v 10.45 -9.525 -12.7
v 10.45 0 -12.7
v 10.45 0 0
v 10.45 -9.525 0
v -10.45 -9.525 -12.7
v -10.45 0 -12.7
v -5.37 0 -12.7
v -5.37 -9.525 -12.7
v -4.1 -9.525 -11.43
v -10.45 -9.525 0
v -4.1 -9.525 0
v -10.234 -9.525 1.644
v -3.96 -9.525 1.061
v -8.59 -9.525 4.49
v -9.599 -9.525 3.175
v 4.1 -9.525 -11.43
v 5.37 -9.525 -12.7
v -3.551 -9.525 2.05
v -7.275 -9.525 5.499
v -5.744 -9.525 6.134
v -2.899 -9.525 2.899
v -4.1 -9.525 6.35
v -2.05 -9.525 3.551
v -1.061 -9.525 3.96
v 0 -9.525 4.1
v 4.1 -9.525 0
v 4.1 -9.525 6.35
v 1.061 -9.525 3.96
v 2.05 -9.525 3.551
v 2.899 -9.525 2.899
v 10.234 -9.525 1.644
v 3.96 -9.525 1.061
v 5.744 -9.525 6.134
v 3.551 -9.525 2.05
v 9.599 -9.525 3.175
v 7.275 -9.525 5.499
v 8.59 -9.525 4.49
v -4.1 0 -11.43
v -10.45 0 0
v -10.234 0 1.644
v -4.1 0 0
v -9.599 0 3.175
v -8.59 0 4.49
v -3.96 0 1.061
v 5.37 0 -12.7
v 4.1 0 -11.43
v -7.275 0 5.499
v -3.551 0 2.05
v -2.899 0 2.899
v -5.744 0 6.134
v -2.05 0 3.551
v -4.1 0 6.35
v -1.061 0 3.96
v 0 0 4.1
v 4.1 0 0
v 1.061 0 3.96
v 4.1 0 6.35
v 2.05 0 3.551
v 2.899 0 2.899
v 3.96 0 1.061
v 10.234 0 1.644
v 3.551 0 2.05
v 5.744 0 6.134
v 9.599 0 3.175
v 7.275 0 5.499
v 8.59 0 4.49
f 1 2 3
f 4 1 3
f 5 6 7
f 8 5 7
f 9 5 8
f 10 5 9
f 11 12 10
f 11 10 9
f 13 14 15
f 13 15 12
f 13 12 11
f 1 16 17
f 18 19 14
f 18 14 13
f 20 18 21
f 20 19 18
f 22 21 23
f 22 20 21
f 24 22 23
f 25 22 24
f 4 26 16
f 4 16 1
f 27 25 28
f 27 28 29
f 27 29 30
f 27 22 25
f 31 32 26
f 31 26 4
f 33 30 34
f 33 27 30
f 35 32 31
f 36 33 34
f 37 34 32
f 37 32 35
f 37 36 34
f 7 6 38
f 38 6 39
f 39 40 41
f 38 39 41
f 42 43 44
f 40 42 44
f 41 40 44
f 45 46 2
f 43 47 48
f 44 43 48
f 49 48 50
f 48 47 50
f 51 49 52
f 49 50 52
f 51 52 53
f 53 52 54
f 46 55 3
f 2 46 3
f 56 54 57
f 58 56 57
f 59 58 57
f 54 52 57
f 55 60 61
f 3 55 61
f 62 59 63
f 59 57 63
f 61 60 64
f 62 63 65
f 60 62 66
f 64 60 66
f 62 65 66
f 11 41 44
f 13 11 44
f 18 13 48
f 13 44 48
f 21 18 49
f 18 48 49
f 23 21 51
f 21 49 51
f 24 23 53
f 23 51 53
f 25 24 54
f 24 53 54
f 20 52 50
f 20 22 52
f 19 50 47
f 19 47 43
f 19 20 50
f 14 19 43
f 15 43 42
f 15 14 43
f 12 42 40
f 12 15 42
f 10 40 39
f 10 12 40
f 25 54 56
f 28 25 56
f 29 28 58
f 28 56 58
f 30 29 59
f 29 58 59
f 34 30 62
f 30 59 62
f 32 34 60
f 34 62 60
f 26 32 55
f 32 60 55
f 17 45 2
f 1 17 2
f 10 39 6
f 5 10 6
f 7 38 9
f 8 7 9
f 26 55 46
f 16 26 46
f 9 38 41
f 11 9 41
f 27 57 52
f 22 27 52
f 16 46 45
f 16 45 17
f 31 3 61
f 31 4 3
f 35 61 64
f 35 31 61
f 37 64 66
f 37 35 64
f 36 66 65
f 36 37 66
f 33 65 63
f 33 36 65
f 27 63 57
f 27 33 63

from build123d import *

# Parameters (mm, degrees)
F1_DEPTH = 9.525
F2_R     = 6.35
F3_SIZE  = 1.27


with BuildPart() as f1:
    # F0 (on Front) → F1 (new body)
    with BuildSketch(Plane.XZ):
        with BuildLine():
            Line((-4.1, -12.7), (-4.1, 0))
            ThreePointArc((-4.1, 0), (-2.899138, 2.899138), (0, 4.1))
            Line((0, 4.1), (0, 6.35))
            Line((0, 6.35), (-10.45, 6.35))
            Line((-10.45, 6.35), (-10.45, -12.7))
            Line((-10.45, -12.7), (-4.1, -12.7))
        make_face()
        with BuildLine():
            Line((0, 6.35), (0, 4.1))
            ThreePointArc((0, 4.1), (2.899138, 2.899138), (4.1, 0))
            Line((4.1, 0), (4.1, -12.7))
            Line((4.1, -12.7), (10.45, -12.7))
            Line((10.45, -12.7), (10.45, 6.35))
            Line((10.45, 6.35), (0, 6.35))
        make_face()
    extrude(amount=F1_DEPTH)

    # F2
    f2_edges = [f1.edges().sort_by_distance(p)[0] for p in [
        (-10.45, -4.7625, 6.35),
        (10.45, -4.7625, 6.35),
    ]]
    fillet(f2_edges, radius=F2_R)

    # F3
    f3_edges = [f1.edges().sort_by_distance(p)[0] for p in [
        (-4.1, -4.7625, -12.7),
        (4.1, -4.7625, -12.7),
    ]]
    chamfer(f3_edges, length=F3_SIZE)


solid = f1.part
